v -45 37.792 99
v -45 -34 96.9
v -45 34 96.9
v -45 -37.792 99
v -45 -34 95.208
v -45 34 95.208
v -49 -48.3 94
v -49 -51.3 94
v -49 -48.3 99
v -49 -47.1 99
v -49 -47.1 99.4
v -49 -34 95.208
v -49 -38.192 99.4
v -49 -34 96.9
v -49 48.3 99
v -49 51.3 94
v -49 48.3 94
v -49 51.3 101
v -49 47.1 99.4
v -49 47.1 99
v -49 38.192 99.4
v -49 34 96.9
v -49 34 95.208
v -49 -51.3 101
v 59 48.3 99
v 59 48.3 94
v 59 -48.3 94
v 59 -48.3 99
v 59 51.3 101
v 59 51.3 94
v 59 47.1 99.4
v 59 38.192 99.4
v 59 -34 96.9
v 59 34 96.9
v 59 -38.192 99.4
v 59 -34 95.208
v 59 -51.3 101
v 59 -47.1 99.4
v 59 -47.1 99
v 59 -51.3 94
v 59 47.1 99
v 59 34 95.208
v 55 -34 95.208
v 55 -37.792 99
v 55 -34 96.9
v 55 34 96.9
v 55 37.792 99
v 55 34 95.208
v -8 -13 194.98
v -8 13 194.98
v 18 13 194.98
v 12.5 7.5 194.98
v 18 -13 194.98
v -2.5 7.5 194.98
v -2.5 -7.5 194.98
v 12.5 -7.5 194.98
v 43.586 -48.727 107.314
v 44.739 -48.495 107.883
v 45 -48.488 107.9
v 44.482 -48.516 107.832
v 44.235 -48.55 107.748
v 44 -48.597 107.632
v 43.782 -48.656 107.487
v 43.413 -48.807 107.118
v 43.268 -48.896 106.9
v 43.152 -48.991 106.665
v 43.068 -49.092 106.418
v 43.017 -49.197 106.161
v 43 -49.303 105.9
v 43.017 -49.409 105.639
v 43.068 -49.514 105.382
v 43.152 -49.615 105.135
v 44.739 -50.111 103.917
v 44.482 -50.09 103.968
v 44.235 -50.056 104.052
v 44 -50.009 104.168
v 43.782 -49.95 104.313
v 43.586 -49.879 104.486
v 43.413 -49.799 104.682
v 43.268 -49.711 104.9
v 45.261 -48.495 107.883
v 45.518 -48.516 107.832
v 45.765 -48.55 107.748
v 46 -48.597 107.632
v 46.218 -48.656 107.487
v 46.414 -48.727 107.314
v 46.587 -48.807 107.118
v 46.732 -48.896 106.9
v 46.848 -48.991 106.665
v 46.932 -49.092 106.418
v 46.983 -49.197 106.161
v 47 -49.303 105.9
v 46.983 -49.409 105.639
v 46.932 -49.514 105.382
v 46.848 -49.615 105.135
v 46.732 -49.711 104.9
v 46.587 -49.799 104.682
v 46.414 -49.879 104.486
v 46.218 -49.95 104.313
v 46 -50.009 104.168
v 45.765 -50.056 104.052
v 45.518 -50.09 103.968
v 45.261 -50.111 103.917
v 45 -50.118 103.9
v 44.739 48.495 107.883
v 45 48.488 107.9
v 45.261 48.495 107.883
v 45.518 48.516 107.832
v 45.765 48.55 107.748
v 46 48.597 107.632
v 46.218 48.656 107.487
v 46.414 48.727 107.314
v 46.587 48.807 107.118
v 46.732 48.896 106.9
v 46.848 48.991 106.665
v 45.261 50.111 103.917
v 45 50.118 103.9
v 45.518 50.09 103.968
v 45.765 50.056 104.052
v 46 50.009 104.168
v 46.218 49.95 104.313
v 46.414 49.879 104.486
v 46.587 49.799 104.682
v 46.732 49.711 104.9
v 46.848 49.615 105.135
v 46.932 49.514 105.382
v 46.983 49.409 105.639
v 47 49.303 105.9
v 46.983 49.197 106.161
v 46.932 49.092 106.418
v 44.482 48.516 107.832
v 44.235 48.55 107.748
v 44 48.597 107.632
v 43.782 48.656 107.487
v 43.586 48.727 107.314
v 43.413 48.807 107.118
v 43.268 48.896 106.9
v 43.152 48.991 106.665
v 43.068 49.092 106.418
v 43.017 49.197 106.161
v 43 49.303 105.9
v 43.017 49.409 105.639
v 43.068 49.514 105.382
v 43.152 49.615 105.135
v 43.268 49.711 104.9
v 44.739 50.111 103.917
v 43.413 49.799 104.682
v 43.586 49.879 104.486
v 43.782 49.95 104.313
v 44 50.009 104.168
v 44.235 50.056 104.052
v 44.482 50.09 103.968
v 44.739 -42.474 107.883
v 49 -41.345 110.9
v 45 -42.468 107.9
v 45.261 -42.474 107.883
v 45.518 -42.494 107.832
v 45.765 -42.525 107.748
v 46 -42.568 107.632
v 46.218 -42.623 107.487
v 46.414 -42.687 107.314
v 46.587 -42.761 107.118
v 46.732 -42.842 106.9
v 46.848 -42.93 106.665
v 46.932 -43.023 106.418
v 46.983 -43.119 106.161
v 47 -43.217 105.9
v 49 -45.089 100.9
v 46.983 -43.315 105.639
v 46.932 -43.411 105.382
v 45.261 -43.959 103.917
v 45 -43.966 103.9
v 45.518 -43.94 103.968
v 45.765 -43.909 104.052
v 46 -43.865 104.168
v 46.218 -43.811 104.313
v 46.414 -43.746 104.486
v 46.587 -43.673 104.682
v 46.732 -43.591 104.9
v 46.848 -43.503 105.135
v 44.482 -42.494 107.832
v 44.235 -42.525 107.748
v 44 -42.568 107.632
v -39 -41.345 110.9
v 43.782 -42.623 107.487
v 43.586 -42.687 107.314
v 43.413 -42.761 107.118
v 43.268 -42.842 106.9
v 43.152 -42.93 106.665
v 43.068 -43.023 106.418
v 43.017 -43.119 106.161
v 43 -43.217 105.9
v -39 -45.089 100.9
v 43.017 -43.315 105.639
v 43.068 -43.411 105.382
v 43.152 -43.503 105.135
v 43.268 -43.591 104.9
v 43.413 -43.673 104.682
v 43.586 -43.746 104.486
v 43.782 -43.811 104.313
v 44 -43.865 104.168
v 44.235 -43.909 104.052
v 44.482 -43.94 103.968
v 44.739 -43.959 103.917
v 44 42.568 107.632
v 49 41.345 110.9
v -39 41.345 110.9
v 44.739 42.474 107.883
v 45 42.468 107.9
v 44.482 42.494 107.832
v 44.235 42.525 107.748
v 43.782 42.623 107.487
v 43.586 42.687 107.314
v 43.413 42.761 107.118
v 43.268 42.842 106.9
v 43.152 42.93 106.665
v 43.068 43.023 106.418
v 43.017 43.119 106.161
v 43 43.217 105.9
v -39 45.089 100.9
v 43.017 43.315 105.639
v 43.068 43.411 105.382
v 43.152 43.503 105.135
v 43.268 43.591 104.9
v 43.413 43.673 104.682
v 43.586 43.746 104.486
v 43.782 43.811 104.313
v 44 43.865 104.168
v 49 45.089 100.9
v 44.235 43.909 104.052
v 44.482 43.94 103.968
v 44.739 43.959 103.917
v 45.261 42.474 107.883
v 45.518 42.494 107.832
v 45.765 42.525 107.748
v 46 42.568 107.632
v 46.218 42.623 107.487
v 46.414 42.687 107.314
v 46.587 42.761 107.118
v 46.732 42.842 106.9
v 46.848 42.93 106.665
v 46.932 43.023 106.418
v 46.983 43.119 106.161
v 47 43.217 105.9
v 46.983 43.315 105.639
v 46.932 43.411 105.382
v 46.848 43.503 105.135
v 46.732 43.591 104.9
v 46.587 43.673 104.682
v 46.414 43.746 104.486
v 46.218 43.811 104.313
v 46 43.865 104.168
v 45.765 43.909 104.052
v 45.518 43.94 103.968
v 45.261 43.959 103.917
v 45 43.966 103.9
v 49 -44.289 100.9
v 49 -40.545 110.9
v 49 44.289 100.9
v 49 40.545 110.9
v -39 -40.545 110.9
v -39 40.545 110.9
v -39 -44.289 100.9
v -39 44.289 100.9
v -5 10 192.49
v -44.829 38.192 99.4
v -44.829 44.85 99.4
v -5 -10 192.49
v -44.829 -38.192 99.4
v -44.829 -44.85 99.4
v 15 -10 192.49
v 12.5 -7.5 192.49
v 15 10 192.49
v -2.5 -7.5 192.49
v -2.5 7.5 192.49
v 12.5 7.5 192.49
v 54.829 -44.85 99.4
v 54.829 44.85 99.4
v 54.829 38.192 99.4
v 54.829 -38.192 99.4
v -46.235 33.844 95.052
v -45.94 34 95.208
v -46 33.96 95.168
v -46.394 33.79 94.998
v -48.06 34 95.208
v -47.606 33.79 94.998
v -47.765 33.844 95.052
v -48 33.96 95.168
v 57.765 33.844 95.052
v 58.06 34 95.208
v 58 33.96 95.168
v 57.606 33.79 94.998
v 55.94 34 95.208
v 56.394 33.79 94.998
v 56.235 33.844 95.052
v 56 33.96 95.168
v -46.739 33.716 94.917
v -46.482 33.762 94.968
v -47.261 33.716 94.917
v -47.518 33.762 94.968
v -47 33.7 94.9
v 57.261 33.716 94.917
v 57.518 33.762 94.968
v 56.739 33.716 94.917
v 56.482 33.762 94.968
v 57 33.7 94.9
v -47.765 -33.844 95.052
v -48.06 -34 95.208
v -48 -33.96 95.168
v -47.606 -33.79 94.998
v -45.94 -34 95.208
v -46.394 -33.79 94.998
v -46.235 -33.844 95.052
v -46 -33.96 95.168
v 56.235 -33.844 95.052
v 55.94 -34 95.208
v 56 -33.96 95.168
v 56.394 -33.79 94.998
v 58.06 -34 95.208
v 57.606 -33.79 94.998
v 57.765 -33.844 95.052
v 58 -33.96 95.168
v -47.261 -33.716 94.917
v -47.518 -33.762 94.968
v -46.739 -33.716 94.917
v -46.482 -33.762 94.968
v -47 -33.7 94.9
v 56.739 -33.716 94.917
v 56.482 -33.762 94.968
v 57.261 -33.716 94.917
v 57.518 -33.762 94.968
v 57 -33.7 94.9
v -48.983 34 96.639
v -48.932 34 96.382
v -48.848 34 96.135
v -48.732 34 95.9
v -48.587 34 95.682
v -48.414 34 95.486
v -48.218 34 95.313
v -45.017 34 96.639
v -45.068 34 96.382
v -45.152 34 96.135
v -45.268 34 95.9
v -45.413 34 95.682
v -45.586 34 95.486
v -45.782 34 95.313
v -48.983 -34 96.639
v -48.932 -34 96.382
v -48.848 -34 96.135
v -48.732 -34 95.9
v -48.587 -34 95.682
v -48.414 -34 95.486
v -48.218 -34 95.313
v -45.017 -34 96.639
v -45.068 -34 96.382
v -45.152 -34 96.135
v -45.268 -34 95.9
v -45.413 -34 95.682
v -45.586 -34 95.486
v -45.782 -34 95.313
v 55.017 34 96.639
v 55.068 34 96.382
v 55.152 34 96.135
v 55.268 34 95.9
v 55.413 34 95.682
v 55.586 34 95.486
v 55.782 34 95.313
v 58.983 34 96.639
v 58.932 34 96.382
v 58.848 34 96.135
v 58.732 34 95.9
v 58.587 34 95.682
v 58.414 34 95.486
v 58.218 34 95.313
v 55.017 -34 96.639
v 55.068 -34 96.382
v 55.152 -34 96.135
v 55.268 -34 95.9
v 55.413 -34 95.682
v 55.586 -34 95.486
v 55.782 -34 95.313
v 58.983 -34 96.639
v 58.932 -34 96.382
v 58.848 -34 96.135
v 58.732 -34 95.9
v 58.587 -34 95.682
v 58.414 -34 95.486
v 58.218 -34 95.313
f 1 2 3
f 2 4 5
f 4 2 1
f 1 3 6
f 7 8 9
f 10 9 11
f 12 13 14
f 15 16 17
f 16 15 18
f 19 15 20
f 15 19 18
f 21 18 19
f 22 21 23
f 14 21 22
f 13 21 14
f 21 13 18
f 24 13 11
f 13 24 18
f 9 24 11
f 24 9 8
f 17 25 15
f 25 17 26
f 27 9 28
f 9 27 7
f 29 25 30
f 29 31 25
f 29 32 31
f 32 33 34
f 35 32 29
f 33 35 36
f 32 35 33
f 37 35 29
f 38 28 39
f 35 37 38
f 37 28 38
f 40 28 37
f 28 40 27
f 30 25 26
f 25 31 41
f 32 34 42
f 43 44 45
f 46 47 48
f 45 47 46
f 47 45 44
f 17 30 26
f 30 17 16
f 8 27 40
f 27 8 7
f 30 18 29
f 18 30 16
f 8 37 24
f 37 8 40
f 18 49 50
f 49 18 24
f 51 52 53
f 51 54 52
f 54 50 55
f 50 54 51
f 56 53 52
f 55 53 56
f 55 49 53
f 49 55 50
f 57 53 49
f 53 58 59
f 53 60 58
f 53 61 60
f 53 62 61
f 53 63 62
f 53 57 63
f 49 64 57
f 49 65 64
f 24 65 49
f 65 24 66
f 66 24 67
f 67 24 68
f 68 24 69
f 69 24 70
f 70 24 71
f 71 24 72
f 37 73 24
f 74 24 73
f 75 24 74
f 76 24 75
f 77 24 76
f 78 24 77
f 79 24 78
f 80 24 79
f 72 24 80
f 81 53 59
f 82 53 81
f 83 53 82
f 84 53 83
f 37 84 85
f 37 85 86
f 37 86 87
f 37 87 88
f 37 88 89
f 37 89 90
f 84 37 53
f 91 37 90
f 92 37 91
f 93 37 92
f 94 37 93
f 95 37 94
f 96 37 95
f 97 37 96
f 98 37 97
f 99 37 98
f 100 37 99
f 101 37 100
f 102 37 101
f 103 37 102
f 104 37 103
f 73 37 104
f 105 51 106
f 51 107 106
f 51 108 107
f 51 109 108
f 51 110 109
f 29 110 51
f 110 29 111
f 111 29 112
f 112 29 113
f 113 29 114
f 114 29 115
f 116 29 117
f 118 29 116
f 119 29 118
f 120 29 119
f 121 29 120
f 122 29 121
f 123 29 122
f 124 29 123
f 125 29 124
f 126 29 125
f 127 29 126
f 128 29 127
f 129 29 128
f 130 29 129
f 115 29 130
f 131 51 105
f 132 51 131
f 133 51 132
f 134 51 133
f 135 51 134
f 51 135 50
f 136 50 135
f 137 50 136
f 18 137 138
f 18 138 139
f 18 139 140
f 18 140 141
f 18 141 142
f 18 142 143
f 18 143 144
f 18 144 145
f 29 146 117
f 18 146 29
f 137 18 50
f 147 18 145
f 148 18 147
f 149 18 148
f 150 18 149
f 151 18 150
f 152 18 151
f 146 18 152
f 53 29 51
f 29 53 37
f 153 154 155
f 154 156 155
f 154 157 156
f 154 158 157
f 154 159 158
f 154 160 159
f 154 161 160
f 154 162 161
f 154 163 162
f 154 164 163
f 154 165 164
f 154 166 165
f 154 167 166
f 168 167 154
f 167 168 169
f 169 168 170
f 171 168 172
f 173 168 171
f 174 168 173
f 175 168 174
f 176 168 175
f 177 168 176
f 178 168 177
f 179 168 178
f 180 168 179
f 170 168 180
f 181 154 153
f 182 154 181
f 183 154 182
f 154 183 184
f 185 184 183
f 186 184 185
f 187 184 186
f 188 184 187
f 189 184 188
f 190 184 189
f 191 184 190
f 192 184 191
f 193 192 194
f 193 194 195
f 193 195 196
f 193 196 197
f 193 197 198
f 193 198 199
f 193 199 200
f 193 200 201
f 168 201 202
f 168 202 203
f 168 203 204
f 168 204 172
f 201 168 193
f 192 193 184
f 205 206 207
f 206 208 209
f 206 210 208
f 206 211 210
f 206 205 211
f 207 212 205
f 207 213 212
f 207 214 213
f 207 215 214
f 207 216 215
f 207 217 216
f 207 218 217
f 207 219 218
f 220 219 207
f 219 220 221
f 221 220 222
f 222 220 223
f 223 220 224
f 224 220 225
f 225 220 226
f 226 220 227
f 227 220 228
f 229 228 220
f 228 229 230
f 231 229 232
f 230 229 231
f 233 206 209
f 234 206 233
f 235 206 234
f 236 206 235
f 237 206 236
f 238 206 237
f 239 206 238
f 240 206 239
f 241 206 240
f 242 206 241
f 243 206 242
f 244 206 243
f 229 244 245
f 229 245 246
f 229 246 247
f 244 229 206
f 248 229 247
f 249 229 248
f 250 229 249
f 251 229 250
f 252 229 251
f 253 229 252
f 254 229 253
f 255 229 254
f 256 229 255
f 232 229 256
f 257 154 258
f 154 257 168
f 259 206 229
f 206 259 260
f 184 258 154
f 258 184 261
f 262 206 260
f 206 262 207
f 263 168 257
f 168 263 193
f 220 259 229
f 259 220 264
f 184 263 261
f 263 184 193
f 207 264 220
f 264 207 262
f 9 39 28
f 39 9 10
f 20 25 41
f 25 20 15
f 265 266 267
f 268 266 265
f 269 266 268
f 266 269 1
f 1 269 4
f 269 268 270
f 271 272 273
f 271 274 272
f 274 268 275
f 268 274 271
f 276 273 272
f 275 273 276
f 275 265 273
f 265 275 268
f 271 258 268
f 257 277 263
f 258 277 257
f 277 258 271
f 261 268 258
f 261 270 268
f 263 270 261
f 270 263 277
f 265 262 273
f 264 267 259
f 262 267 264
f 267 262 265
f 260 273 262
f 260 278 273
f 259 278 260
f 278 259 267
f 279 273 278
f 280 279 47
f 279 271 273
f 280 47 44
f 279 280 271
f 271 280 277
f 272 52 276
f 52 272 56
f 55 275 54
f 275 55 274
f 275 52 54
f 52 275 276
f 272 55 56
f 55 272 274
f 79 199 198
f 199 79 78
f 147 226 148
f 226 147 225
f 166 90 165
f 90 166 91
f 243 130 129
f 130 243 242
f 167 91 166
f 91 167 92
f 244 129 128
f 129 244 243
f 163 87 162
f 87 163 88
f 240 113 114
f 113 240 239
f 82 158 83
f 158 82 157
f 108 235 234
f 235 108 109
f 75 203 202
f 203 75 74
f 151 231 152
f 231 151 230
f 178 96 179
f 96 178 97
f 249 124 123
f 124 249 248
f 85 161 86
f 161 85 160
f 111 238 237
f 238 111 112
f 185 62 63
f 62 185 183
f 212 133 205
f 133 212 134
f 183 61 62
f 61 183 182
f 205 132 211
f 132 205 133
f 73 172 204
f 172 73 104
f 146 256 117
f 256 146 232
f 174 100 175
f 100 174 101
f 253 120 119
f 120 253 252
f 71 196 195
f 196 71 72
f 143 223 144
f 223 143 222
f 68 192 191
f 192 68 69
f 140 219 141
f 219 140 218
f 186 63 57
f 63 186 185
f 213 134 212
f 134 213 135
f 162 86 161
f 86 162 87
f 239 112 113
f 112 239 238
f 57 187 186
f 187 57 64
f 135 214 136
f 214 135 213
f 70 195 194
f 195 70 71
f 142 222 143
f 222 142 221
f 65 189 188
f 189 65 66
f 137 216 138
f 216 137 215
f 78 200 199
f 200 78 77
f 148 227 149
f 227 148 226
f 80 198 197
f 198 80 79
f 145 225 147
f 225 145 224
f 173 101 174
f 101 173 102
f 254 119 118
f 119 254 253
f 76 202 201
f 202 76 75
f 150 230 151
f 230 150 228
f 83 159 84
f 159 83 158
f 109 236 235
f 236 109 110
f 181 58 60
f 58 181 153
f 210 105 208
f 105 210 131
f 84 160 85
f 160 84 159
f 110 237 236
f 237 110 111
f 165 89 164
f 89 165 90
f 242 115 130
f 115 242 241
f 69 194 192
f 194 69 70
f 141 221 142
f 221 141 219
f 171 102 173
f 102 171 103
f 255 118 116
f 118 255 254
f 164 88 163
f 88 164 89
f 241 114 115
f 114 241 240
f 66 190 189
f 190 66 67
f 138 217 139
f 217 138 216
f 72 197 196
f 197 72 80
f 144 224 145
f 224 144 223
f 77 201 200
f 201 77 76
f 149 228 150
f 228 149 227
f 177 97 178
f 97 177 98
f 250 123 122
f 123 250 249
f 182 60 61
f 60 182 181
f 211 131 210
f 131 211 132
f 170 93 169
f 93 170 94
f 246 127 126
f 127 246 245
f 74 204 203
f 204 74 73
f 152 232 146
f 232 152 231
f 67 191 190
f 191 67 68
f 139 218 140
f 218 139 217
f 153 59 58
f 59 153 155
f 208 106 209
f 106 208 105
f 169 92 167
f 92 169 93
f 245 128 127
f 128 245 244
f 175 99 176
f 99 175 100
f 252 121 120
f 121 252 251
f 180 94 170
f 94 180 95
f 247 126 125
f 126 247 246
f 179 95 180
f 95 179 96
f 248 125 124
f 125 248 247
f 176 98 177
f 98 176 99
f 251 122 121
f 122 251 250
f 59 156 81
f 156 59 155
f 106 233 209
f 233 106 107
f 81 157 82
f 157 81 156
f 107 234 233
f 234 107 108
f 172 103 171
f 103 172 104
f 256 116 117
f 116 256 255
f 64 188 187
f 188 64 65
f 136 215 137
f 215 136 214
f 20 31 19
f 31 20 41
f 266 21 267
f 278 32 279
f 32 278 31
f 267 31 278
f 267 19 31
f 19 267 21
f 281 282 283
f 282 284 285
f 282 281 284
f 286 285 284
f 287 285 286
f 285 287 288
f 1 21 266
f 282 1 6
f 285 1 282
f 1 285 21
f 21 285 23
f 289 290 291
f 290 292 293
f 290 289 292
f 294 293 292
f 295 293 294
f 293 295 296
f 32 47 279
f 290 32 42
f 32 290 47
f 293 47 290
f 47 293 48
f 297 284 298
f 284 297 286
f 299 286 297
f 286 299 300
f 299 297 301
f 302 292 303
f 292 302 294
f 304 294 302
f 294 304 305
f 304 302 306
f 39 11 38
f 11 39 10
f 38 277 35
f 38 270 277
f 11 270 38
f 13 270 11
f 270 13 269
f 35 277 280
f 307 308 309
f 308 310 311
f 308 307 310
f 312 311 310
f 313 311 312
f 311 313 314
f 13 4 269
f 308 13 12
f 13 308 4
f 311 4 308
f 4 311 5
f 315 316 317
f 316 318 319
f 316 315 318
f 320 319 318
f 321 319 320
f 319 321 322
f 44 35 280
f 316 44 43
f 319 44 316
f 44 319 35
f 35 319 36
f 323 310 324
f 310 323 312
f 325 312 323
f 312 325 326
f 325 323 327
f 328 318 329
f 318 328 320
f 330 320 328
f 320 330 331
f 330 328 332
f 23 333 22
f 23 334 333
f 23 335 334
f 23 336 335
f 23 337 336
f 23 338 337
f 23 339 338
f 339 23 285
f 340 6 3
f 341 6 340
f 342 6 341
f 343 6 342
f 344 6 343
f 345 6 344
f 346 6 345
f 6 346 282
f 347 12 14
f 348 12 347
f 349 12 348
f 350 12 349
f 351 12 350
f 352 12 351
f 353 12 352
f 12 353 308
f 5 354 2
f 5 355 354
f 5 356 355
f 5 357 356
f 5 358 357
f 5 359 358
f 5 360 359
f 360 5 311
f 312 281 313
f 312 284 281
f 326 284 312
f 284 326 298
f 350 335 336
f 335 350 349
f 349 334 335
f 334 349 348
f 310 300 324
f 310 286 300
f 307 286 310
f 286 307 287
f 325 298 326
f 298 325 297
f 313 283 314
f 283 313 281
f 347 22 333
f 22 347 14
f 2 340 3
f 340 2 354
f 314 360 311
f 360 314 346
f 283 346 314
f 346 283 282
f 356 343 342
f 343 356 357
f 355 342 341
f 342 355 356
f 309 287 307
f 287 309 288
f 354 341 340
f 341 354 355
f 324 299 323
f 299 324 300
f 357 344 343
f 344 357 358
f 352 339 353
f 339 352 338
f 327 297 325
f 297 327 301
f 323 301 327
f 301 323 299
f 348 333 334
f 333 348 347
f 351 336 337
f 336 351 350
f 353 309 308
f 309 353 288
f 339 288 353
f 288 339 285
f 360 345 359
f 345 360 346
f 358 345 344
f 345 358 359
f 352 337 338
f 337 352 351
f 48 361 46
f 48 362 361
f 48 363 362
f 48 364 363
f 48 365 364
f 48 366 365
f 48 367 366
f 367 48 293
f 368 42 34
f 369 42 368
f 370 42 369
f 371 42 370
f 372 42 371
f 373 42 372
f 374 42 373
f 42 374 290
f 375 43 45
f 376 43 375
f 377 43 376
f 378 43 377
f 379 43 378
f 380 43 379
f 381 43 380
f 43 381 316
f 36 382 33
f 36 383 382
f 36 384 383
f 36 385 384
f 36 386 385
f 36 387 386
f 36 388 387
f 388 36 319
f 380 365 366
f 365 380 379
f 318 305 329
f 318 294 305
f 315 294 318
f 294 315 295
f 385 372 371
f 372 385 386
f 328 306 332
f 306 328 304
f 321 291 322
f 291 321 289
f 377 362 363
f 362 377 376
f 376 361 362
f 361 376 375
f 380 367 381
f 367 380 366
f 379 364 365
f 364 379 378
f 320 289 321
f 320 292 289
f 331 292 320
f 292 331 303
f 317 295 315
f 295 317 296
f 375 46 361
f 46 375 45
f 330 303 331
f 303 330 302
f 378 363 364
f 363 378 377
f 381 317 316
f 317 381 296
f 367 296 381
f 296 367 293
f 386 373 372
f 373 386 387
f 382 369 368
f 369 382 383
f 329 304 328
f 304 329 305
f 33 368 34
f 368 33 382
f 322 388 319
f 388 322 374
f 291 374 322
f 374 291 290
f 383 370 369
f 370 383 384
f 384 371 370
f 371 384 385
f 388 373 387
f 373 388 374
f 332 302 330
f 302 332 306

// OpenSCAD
// v3 assembly video: scan-station parts (machine coordinates), step 6.
// openscad --backend=manifold -D 'part="v3_hood"' -o hood.stl w_scan.scad
include <../scanner_hood.scad>
include <hw_common.scad>
part = "v3_hood";
P = part;

// LED strips: the 0.8 mm recess bands in the two long walls (Z 100.9..110.9, X cx ± 44)
module led_strips() intersection() {
    difference() {
        hull() { slab_c(in_hx + led_d, rail_in + led_d, rail_top - 0.01); slab_c(top_in + led_d, top_in + led_d, roof_bot); }
        hull() { slab_c(in_hx - 0.01, rail_in - 0.01, rail_top - 0.02); slab_c(top_in - 0.01, top_in - 0.01, roof_bot + 0.01); }
    }
    translate([cx - led_hx, -100, zc + led_h[0]]) cube([2 * led_hx, 200, led_h[1] - led_h[0]]);
    union() for (s = [-1, 1]) translate([cx - 100, s > 0 ? 25 : -125, 0]) cube([200, 100, 300]);
}
cam_holes = [for (u = [2.0, 23.0]) for (v = [2.0, 14.5]) [u - 12.5, -(v - 14.4)]];
module cam_screws() for (h = cam_holes) at_screw([cx + h[0], h[1], zc + 106.98], [0, 0, 1]) shcs(10, d = 2, hd = 3.8, hh = 1.3);
module bracket_screws() for (x = [-20, 10]) at_screw([x, -75, 74], [0, 0, -1]) shcs(16);
module foam_ring() translate([cx, 0, roof_top]) difference() { cylinder(d = 21, h = 2.9, $fn = 40); translate([0, 0, -1]) cylinder(d = 8.5, h = 5, $fn = 32); }
// FPC connector on the PCB back (+Z) at the −Y edge, for a recognisable camera
module camera() {
    camera_ghost_placed();
    translate([cx - 8, -(23.862 - 14.4) - 0.5, zc + 106.98 + 1.12]) cube([16, 5.5, 3.2]);
}

if (P == "v3_guide_back") guide_back();
if (P == "v3_guide_front") guide_front();
if (P == "v3_clips") for (x = guide_clip_x()) { clip_back(x); mirror([0, 1, 0]) clip_back(x); }
if (P == "v3_hood") scanner_hood();
if (P == "v3_leds") led_strips();
if (P == "v3_cam_bracket") camera_bracket_placed();
if (P == "v3_camera") camera();
if (P == "v3_cam_screws") cam_screws();
if (P == "v3_bracket_screws") bracket_screws();
if (P == "v3_foam_ring") foam_ring();
